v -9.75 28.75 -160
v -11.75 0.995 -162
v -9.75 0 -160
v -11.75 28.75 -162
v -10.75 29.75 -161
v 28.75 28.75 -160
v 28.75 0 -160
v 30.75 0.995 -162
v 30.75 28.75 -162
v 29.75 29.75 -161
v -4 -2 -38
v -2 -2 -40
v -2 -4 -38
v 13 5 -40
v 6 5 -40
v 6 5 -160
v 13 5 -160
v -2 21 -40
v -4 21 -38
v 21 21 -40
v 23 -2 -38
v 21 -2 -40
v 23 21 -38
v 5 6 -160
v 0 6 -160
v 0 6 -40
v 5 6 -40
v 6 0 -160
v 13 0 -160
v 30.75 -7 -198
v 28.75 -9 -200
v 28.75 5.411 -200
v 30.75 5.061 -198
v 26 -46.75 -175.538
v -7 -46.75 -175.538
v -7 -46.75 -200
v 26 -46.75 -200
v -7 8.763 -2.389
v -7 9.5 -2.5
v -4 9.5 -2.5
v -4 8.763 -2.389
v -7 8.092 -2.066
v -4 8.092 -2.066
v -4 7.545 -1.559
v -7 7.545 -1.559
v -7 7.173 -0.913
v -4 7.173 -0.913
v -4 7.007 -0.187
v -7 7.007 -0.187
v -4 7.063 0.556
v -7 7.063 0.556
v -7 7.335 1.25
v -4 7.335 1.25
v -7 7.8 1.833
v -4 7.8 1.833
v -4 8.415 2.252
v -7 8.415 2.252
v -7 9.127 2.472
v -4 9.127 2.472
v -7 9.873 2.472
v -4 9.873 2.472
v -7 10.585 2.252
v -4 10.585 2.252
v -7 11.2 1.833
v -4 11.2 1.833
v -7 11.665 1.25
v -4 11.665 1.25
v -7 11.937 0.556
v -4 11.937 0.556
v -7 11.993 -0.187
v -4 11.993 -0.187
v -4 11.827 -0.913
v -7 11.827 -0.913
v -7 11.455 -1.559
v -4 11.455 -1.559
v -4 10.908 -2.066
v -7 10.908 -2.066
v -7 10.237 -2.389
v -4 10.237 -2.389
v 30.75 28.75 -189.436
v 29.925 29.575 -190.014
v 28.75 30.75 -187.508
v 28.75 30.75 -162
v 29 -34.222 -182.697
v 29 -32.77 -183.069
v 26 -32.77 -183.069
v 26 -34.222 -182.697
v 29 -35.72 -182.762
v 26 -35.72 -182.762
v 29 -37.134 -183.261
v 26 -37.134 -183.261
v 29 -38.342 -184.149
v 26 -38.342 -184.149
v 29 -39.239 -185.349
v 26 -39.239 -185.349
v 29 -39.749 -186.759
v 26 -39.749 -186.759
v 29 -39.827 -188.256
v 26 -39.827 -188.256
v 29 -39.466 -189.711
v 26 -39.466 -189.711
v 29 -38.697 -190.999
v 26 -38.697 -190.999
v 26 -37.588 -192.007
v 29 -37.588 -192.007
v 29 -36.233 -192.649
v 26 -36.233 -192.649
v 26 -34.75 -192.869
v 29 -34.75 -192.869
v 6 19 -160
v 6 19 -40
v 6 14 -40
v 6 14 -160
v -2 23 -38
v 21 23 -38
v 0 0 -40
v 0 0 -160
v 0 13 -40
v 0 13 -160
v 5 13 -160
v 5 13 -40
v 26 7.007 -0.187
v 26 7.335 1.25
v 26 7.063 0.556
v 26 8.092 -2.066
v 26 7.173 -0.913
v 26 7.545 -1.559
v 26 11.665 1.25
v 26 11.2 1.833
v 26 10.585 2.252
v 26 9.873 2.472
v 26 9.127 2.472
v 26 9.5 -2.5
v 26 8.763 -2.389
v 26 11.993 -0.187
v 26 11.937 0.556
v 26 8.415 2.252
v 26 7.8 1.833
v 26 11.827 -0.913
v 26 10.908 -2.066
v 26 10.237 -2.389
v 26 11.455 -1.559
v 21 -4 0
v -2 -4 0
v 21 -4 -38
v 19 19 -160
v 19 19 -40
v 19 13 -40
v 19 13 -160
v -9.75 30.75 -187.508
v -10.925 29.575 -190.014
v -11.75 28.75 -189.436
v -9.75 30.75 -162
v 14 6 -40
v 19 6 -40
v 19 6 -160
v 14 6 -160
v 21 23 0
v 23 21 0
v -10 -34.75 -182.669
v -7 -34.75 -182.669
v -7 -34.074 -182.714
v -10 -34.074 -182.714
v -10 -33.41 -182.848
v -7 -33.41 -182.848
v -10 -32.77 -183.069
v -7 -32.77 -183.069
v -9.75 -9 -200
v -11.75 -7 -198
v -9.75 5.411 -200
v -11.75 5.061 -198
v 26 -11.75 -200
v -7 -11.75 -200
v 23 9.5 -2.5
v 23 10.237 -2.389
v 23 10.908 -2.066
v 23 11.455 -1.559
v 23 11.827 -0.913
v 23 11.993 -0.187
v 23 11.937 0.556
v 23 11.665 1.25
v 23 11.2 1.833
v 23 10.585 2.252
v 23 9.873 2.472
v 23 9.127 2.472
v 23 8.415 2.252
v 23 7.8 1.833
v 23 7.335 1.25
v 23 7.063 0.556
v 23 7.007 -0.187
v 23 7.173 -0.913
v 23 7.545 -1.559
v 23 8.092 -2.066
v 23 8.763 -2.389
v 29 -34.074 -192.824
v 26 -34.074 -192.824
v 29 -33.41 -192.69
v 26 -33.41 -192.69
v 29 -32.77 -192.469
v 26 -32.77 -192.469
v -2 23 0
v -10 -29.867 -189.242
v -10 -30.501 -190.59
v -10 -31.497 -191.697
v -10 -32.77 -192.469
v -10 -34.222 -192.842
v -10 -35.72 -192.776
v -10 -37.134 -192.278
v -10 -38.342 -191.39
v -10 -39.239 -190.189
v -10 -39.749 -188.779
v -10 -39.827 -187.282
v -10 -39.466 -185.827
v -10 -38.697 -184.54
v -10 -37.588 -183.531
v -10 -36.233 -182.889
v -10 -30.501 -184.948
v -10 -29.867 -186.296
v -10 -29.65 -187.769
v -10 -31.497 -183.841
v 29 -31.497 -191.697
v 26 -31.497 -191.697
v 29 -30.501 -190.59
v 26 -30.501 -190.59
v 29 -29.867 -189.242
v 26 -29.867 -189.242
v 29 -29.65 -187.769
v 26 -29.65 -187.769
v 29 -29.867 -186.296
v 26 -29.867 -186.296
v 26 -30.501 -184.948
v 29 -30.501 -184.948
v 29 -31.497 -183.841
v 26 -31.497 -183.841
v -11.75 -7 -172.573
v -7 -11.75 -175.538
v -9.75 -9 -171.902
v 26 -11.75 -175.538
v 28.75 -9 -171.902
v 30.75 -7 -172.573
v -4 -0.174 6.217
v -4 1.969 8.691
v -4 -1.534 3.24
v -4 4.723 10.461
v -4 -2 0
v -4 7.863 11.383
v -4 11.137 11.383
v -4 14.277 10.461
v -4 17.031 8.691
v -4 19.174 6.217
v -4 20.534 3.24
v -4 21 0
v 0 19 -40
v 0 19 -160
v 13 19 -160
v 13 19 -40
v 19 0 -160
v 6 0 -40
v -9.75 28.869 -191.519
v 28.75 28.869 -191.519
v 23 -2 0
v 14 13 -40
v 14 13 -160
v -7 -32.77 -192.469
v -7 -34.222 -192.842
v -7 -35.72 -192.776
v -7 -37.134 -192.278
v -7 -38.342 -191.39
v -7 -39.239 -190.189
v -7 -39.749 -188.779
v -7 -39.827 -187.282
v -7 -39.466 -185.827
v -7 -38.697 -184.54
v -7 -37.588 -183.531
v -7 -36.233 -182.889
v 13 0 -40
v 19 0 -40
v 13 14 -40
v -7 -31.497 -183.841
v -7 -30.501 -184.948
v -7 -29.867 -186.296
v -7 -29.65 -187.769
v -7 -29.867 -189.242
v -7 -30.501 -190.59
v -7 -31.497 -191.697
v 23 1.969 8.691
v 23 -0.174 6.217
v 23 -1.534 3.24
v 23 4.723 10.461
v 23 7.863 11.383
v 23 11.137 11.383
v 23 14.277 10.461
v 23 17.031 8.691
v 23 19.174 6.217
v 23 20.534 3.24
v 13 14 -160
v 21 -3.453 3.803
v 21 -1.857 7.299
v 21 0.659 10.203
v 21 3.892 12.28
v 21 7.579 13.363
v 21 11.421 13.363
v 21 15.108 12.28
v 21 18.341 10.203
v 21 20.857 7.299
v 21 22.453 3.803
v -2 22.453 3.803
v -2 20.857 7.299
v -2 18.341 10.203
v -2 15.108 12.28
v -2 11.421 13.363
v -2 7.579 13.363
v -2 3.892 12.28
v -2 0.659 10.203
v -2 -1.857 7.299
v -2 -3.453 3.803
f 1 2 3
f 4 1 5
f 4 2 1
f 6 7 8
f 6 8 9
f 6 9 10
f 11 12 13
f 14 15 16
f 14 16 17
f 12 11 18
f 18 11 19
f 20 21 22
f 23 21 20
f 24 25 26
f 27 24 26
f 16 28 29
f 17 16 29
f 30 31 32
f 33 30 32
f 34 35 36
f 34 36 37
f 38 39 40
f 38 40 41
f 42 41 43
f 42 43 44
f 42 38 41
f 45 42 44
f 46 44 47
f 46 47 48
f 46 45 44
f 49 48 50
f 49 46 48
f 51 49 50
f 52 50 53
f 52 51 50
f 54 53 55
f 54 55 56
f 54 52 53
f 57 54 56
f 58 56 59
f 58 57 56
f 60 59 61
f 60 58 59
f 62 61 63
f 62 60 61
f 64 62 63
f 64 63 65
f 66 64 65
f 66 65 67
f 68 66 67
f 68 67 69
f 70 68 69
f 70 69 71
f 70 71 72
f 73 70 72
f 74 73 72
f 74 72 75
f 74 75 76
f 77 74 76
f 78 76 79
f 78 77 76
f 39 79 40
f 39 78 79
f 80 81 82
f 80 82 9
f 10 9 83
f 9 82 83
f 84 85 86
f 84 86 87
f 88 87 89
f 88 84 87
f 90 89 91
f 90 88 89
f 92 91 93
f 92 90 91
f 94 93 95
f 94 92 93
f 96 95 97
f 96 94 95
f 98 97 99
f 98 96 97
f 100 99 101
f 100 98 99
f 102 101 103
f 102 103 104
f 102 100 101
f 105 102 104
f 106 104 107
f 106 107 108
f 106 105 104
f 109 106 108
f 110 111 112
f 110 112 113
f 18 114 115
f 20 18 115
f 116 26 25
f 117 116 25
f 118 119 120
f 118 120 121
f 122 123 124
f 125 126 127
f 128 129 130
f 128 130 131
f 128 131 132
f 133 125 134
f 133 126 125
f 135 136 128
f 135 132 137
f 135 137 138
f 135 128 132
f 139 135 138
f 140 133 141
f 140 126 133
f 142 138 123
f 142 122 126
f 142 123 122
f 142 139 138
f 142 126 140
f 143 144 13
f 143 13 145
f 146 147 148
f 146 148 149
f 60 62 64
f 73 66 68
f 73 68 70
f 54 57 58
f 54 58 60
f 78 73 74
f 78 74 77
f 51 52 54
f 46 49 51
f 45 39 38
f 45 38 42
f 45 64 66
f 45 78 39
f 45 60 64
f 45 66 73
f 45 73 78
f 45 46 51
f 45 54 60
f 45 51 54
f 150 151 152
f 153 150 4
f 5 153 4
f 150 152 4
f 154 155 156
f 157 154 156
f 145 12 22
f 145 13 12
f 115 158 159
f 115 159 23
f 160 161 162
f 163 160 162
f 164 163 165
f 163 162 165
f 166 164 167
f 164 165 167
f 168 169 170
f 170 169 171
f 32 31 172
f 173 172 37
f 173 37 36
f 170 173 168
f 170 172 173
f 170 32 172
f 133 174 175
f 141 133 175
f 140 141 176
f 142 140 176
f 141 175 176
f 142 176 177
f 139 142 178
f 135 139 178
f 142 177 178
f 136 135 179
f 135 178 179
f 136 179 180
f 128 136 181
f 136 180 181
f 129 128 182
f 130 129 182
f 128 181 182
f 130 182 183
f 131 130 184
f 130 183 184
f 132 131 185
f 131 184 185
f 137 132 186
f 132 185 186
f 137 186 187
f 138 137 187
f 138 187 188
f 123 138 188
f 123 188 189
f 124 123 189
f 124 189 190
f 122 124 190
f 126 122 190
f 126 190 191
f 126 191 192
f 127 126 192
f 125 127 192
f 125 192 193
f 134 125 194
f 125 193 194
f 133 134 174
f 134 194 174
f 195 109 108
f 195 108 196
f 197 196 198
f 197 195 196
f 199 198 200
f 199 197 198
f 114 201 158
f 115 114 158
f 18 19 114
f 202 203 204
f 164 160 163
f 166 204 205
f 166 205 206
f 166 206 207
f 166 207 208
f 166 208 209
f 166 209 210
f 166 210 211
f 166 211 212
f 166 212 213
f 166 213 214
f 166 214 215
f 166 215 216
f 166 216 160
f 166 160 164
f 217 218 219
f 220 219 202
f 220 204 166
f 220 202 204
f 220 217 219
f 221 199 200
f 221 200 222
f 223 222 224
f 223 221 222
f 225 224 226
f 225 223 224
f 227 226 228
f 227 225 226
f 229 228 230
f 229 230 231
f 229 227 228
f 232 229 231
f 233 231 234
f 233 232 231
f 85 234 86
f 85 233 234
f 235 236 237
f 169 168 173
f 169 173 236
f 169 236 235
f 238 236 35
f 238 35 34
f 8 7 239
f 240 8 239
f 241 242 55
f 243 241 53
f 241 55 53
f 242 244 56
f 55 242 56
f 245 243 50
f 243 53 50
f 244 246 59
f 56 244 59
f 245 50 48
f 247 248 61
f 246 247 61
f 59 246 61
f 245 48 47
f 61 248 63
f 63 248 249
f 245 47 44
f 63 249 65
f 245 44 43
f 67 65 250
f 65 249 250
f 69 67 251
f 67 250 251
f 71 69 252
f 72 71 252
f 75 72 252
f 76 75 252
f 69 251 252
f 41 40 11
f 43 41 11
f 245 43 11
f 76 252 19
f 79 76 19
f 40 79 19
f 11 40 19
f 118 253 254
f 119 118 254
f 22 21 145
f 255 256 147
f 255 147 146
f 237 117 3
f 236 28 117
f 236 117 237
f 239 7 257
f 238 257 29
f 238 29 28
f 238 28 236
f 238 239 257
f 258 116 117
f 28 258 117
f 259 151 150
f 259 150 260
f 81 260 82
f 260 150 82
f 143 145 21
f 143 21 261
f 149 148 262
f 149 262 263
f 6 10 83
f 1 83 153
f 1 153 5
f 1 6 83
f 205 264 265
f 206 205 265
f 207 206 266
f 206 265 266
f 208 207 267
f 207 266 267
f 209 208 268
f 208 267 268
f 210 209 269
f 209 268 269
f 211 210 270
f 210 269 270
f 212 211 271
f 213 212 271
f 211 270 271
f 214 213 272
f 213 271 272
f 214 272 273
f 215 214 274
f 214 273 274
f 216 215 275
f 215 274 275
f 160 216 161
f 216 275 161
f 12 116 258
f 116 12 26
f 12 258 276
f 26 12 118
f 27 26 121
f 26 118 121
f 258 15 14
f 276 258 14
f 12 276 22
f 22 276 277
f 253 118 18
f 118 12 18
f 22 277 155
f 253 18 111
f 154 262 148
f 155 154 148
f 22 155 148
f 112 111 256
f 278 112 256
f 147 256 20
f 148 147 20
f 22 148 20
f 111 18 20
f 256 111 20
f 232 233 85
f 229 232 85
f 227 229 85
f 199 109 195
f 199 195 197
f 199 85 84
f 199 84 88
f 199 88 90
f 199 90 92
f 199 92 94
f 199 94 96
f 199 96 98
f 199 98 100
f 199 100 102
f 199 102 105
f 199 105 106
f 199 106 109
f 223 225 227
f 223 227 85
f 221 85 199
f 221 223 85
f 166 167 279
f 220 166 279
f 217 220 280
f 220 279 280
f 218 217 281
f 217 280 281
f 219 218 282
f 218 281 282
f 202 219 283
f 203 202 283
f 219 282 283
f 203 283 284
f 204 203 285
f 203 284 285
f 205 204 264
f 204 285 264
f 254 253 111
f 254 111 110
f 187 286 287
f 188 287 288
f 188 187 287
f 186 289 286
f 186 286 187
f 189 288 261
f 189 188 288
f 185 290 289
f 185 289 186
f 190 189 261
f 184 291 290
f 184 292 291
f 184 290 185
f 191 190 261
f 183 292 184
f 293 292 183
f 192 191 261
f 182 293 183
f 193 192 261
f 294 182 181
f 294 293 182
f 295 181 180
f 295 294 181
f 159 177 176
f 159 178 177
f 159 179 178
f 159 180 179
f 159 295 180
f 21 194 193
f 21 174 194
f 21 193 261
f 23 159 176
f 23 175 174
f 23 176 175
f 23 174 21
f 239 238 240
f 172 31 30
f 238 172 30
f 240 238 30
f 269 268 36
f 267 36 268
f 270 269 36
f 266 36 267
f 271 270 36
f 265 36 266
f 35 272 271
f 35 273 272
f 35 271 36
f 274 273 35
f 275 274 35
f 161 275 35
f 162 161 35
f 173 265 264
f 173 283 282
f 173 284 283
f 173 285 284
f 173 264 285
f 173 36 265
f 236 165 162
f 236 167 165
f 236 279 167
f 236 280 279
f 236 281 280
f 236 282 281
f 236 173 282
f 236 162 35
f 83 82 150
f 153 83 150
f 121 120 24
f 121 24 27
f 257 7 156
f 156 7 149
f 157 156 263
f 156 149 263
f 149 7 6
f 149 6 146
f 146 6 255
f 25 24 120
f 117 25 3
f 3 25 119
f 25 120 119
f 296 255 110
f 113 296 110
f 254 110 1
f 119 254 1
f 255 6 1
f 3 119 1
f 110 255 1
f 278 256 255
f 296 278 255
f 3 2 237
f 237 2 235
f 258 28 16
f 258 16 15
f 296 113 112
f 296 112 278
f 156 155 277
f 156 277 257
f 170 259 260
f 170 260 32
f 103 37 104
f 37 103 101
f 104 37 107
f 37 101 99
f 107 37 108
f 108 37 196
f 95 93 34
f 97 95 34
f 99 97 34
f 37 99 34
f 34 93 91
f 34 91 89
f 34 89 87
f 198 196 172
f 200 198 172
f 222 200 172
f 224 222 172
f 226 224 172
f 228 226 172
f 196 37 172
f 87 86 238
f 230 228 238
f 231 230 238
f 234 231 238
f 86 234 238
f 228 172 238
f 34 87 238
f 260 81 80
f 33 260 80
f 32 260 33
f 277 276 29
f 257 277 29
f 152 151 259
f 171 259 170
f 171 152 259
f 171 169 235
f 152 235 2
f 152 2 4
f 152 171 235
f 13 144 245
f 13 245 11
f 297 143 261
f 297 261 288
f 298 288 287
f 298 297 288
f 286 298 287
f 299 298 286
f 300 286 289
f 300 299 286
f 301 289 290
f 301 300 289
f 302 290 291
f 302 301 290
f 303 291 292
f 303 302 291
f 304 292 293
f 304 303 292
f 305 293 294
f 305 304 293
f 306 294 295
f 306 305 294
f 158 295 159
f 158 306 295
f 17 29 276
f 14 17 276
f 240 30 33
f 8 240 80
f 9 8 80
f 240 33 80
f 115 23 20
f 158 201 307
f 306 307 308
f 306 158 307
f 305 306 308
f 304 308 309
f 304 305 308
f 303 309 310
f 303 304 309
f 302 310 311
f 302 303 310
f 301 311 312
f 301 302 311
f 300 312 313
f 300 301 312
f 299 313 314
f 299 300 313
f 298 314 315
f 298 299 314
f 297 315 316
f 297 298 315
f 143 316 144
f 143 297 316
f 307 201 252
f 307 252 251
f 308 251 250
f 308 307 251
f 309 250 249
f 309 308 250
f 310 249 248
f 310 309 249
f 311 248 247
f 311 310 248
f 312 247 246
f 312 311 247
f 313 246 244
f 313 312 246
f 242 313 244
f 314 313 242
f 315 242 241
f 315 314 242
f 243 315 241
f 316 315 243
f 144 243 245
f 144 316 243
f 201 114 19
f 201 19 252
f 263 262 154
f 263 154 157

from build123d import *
from OCP.BRepFilletAPI import BRepFilletAPI_MakeChamfer

# Parameters (mm, degrees)
SKETCH_1_W          = 200
SKETCH_1_H          = 19
EXTRUDE_1_DEPTH     = 19
SKETCH_6_W          = 27
SKETCH_6_H          = 27
EXTRUDE_6_DEPTH     = 40
EXTRUDE_7_DEPTH     = 27
SKETCH_8_W          = 42.5
SKETCH_8_H          = 42.5
EXTRUDE_8_DEPTH     = 40
SKETCH_9_R          = 2.5
EXTRUDE_9_DEPTH     = 3
EXTRUDE_START       = 3
SKETCH_10_R         = 2.5
EXTRUDE_10_DEPTH    = 3
SKETCH_11_W         = 33
SKETCH_11_H         = 24.461700173
EXTRUDE_11_DEPTH    = 35
CUT_EXTRUDE_1_REACH = 211.742
CUT_EXTRUDE_2_DEPTH = 42.5
CUT_EXTRUDE_3_REACH = 222.711
SKETCH_15_W         = 120
SKETCH_15_H         = 7
CUT_EXTRUDE_4_DEPTH = 5
SKETCH_16_W         = 120
SKETCH_16_H         = 7
CUT_EXTRUDE_5_DEPTH = 5
SKETCH_17_W         = 7
SKETCH_17_H         = 120
CUT_EXTRUDE_6_DEPTH = 5
SKETCH_18_W         = 7
SKETCH_18_H         = 120
CUT_EXTRUDE_7_DEPTH = 5
CHAMFER_1_SIZE      = 2
CHAMFER_2_SIZE      = 2
CHAMFER_3_SIZE      = 2
CHAMFER_3_SIZE2     = 3.330930275
CHAMFER_4_SIZE      = 2
BOSS_EXTRUDE1_DEPTH = 3
BOSS_EXTRUDE2_START = 3
BOSS_EXTRUDE2_DEPTH = 3


with BuildPart() as part:
    # 草图1 → 凸台-拉伸1 (new body)
    with BuildSketch(Plane(origin=(0, 0, 0), x_dir=(0, 0, -1), z_dir=(1, 0, 0))):
        with Locations((100, 9.5)):
            Rectangle(SKETCH_1_W, SKETCH_1_H)
    extrude(amount=EXTRUDE_1_DEPTH)

    # 草图6 → 凸台-拉伸6 (add)
    with BuildSketch(Plane.XY):
        with Locations((9.5, 9.5)):
            Rectangle(SKETCH_6_W, SKETCH_6_H)
    extrude(amount=-EXTRUDE_6_DEPTH)

    # 草图7 → 凸台-拉伸7 (add)
    with BuildSketch(Plane(origin=(23, 0, 0), x_dir=(0, 0, -1), z_dir=(1, 0, 0))):
        with BuildLine():
            Line((0, -4), (0, 23))
            ThreePointArc((0, 23), (-13.5, 9.5), (0, -4))
        make_face()
    extrude(amount=-EXTRUDE_7_DEPTH)

    # 草图8 → 凸台-拉伸8 (add)
    with BuildSketch(Plane(origin=(0, 0, -200), x_dir=(-1, 0, 0), z_dir=(0, 0, -1))):
        with Locations((-9.5, 9.5)):
            Rectangle(SKETCH_8_W, SKETCH_8_H)
    extrude(amount=-EXTRUDE_8_DEPTH)

    # 草图9 → 凸台-拉伸9 (add)
    with BuildSketch(Plane(origin=(23, 0, 0), x_dir=(0, 0, -1), z_dir=(1, 0, 0))):
        with Locations((0, 9.5)):
            Circle(SKETCH_9_R)
    extrude(amount=EXTRUDE_9_DEPTH)

    # 草图10 → 凸台-拉伸10 (add)
    with BuildSketch(Plane.ZY.offset(4).offset(EXTRUDE_START)):
        with Locations(Location((0, 9.5, 0), (0, 0, 180))):
            Circle(SKETCH_10_R)
    extrude(amount=-EXTRUDE_10_DEPTH)

    # 草图11 → 凸台-拉伸11 (add)
    with BuildSketch(Plane.XZ.offset(11.75)):
        with Locations((9.5, -187.769149914)):
            Rectangle(SKETCH_11_W, SKETCH_11_H)
    extrude(amount=EXTRUDE_11_DEPTH)

    # 切除-拉伸1: up to this face of the body (flat: up to its plane)
    cut_extrude_1_end = Plane(part.part.faces().sort_by_distance((-11.75, 9.5, -180))[0])
    # 草图12 → 切除-拉伸1 (cut, up to the picked face)
    with BuildSketch(Plane(origin=(30.75, 0, 0), x_dir=(0, 0, -1), z_dir=(1, 0, 0)), mode=Mode.PRIVATE) as cut_extrude_1_sk1:
        Polygon((160, 0), (175.538299827, -11.75), (160, -11.75), align=None)
    cut_extrude_1_tool1 = split(extrude(cut_extrude_1_sk1.sketch, amount=-CUT_EXTRUDE_1_REACH, mode=Mode.PRIVATE), bisect_by=cut_extrude_1_end, keep=Keep.BOTH, mode=Mode.PRIVATE)
    add(cut_extrude_1_tool1.solids().sort_by(Axis((30.75, -7.833333, -165.179433), (-1, 0, 0)))[0], mode=Mode.SUBTRACT)

    # 草图13 → 切除-拉伸2 (cut)
    with BuildSketch(Plane.ZY.offset(11.75)):
        Polygon((-190.839141878, 30.75), (-200, 5.410999189), (-200, 30.75), align=None)
    extrude(amount=-CUT_EXTRUDE_2_DEPTH, mode=Mode.SUBTRACT)

    # 切除-拉伸3: up to this plane
    cut_extrude_3_end = Plane(origin=(-31.230792117, 0, -160), z_dir=(0, 0.7976215614630531, -0.603158225252082))
    # 草图14 → 切除-拉伸3 (cut, up to the surface)
    with BuildSketch(Plane(origin=(0, 0, -200), x_dir=(-1, 0, 0), z_dir=(0, 0, -1)), mode=Mode.PRIVATE) as cut_extrude_3_sk1:
        Polygon((-26, -11.75), (-30.75, -7), (-30.75, -11.75), align=None)
    cut_extrude_3_tool1 = split(extrude(cut_extrude_3_sk1.sketch, amount=-CUT_EXTRUDE_3_REACH, mode=Mode.PRIVATE), bisect_by=cut_extrude_3_end, keep=Keep.BOTH, mode=Mode.PRIVATE)
    add(cut_extrude_3_tool1.solids().sort_by_distance((29.166667, -10.166667, -200))[0], mode=Mode.SUBTRACT)
    # 草图14 → 切除-拉伸3 (cut, up to the surface)
    with BuildSketch(Plane(origin=(0, 0, -200), x_dir=(-1, 0, 0), z_dir=(0, 0, -1)), mode=Mode.PRIVATE) as cut_extrude_3_sk2:
        Polygon((7, -11.75), (11.75, -7), (11.75, -11.75), align=None)
    cut_extrude_3_tool2 = split(extrude(cut_extrude_3_sk2.sketch, amount=-CUT_EXTRUDE_3_REACH, mode=Mode.PRIVATE), bisect_by=cut_extrude_3_end, keep=Keep.BOTH, mode=Mode.PRIVATE)
    add(cut_extrude_3_tool2.solids().sort_by_distance((-10.166667, -10.166667, -200))[0], mode=Mode.SUBTRACT)

    # 草图15 → 切除-拉伸4 (cut)
    with BuildSketch(Plane.ZY):
        with Locations((-100, 9.5)):
            Rectangle(SKETCH_15_W, SKETCH_15_H)
    extrude(amount=-CUT_EXTRUDE_4_DEPTH, mode=Mode.SUBTRACT)

    # 草图16 → 切除-拉伸5 (cut)
    with BuildSketch(Plane(origin=(19, 0, 0), x_dir=(0, 0, -1), z_dir=(1, 0, 0))):
        with Locations((100, 9.5)):
            Rectangle(SKETCH_16_W, SKETCH_16_H)
    extrude(amount=-CUT_EXTRUDE_5_DEPTH, mode=Mode.SUBTRACT)

    # 草图17 → 切除-拉伸6 (cut)
    with BuildSketch(Plane.XZ):
        with Locations((9.5, -100)):
            Rectangle(SKETCH_17_W, SKETCH_17_H)
    extrude(amount=-CUT_EXTRUDE_6_DEPTH, mode=Mode.SUBTRACT)

    # 草图18 → 切除-拉伸7 (cut)
    with BuildSketch(Plane(origin=(0, 19, 0), x_dir=(1, 0, 0), z_dir=(0, 1, 0))):
        with Locations((9.5, 100)):
            Rectangle(SKETCH_18_W, SKETCH_18_H)
    extrude(amount=-CUT_EXTRUDE_7_DEPTH, mode=Mode.SUBTRACT)

    # 倒角1
    chamfer_1_edges = [part.edges().sort_by_distance(p)[0] for p in [
        (30.75, 18.080499595, -195.419570939),
        (30.75, -3.5, -164.628429736),
        (30.75, 15.375, -160),
        (30.75, 30.75, -175.419570939),
        (30.75, -0.794500405, -200),
    ]]
    chamfer(chamfer_1_edges, length=CHAMFER_1_SIZE)

    # 倒角2
    chamfer_2_edges = [part.edges().sort_by_distance(p)[0] for p in [
        (-11.75, -3.5, -164.628429736),
        (-11.75, -0.794500405, -200),
        (-11.75, 30.75, -175.419570939),
        (-11.75, 15.375, -160),
        (-11.75, 18.080499595, -195.419570939),
    ]]
    chamfer(chamfer_2_edges, length=CHAMFER_2_SIZE)

    # 倒角3: one chamfer whose edges measure the first distance from different faces: ONE call of the kernel's chamfer builder (chamfer() names one face for all edges)
    chamfer_3_edges_1 = [part.edges().sort_by_distance(p)[0] for p in [
        (9.5, 30.75, -190.839141878),
    ]]
    chamfer_3_side_1 = [part.faces().sort_by_distance(p)[0] for p in [
        (9.5, 18.080499595, -195.419570939),
    ]]
    chamfer_3_edges_2 = [part.edges().sort_by_distance(p)[0] for p in [
        (9.5, 30.75, -160),
    ]]
    chamfer_3 = BRepFilletAPI_MakeChamfer(part.part.solid().wrapped)
    for e in chamfer_3_edges_1:
        chamfer_3.Add(CHAMFER_3_SIZE, CHAMFER_3_SIZE2, e.wrapped, chamfer_3_side_1[0].wrapped)  # the first distance lies on this face
    for e in chamfer_3_edges_2:
        chamfer_3.Add(CHAMFER_3_SIZE, e.wrapped)
    add(Compound.cast(chamfer_3.Shape()), mode=Mode.REPLACE)

    # 倒角4
    chamfer_4_edges = [part.edges().sort_by_distance(p)[0] for p in [
        (23, 9.5, -40),
        (23, 23, -20),
        (9.5, -4, -40),
        (23, -4, -20),
        (-4, 9.5, -40),
        (-4, -4, -20),
        (9.5, 23, -40),
        (-4, 23, -20),
        (23, 9.5, 13.5),
        (-4, 9.5, 13.5),
    ]]
    chamfer(chamfer_4_edges, length=CHAMFER_4_SIZE)

    # Sketch2 → Boss-Extrude1 (add)
    with BuildSketch(Plane.ZY.offset(7)):
        with BuildLine():
            ThreePointArc((-182.669149914, -34.75), (-182.770150014, -33.740049506), (-183.069149914, -32.770101013))
            ThreePointArc((-183.069149914, -32.770101013), (-187.769149914, -29.65), (-192.469149914, -32.770101013))
            ThreePointArc((-192.469149914, -32.770101013), (-188.779100407, -39.7489999), (-182.669149914, -34.75))
        make_face()
    extrude(amount=BOSS_EXTRUDE1_DEPTH)

    # Sketch3 → Boss-Extrude2 (add)
    with BuildSketch(Plane(origin=(26, 0, 0), x_dir=(0, 0, -1), z_dir=(1, 0, 0)).offset(BOSS_EXTRUDE2_START)):
        with BuildLine():
            ThreePointArc((192.869149914, -34.75), (192.768149814, -33.740049506), (192.469149914, -32.770101013))
            ThreePointArc((192.469149914, -32.770101013), (187.769149914, -29.65), (183.069149914, -32.770101013))
            ThreePointArc((183.069149914, -32.770101013), (186.75919942, -39.7489999), (192.869149914, -34.75))
        make_face()
    extrude(amount=-BOSS_EXTRUDE2_DEPTH)


solid = part.part
